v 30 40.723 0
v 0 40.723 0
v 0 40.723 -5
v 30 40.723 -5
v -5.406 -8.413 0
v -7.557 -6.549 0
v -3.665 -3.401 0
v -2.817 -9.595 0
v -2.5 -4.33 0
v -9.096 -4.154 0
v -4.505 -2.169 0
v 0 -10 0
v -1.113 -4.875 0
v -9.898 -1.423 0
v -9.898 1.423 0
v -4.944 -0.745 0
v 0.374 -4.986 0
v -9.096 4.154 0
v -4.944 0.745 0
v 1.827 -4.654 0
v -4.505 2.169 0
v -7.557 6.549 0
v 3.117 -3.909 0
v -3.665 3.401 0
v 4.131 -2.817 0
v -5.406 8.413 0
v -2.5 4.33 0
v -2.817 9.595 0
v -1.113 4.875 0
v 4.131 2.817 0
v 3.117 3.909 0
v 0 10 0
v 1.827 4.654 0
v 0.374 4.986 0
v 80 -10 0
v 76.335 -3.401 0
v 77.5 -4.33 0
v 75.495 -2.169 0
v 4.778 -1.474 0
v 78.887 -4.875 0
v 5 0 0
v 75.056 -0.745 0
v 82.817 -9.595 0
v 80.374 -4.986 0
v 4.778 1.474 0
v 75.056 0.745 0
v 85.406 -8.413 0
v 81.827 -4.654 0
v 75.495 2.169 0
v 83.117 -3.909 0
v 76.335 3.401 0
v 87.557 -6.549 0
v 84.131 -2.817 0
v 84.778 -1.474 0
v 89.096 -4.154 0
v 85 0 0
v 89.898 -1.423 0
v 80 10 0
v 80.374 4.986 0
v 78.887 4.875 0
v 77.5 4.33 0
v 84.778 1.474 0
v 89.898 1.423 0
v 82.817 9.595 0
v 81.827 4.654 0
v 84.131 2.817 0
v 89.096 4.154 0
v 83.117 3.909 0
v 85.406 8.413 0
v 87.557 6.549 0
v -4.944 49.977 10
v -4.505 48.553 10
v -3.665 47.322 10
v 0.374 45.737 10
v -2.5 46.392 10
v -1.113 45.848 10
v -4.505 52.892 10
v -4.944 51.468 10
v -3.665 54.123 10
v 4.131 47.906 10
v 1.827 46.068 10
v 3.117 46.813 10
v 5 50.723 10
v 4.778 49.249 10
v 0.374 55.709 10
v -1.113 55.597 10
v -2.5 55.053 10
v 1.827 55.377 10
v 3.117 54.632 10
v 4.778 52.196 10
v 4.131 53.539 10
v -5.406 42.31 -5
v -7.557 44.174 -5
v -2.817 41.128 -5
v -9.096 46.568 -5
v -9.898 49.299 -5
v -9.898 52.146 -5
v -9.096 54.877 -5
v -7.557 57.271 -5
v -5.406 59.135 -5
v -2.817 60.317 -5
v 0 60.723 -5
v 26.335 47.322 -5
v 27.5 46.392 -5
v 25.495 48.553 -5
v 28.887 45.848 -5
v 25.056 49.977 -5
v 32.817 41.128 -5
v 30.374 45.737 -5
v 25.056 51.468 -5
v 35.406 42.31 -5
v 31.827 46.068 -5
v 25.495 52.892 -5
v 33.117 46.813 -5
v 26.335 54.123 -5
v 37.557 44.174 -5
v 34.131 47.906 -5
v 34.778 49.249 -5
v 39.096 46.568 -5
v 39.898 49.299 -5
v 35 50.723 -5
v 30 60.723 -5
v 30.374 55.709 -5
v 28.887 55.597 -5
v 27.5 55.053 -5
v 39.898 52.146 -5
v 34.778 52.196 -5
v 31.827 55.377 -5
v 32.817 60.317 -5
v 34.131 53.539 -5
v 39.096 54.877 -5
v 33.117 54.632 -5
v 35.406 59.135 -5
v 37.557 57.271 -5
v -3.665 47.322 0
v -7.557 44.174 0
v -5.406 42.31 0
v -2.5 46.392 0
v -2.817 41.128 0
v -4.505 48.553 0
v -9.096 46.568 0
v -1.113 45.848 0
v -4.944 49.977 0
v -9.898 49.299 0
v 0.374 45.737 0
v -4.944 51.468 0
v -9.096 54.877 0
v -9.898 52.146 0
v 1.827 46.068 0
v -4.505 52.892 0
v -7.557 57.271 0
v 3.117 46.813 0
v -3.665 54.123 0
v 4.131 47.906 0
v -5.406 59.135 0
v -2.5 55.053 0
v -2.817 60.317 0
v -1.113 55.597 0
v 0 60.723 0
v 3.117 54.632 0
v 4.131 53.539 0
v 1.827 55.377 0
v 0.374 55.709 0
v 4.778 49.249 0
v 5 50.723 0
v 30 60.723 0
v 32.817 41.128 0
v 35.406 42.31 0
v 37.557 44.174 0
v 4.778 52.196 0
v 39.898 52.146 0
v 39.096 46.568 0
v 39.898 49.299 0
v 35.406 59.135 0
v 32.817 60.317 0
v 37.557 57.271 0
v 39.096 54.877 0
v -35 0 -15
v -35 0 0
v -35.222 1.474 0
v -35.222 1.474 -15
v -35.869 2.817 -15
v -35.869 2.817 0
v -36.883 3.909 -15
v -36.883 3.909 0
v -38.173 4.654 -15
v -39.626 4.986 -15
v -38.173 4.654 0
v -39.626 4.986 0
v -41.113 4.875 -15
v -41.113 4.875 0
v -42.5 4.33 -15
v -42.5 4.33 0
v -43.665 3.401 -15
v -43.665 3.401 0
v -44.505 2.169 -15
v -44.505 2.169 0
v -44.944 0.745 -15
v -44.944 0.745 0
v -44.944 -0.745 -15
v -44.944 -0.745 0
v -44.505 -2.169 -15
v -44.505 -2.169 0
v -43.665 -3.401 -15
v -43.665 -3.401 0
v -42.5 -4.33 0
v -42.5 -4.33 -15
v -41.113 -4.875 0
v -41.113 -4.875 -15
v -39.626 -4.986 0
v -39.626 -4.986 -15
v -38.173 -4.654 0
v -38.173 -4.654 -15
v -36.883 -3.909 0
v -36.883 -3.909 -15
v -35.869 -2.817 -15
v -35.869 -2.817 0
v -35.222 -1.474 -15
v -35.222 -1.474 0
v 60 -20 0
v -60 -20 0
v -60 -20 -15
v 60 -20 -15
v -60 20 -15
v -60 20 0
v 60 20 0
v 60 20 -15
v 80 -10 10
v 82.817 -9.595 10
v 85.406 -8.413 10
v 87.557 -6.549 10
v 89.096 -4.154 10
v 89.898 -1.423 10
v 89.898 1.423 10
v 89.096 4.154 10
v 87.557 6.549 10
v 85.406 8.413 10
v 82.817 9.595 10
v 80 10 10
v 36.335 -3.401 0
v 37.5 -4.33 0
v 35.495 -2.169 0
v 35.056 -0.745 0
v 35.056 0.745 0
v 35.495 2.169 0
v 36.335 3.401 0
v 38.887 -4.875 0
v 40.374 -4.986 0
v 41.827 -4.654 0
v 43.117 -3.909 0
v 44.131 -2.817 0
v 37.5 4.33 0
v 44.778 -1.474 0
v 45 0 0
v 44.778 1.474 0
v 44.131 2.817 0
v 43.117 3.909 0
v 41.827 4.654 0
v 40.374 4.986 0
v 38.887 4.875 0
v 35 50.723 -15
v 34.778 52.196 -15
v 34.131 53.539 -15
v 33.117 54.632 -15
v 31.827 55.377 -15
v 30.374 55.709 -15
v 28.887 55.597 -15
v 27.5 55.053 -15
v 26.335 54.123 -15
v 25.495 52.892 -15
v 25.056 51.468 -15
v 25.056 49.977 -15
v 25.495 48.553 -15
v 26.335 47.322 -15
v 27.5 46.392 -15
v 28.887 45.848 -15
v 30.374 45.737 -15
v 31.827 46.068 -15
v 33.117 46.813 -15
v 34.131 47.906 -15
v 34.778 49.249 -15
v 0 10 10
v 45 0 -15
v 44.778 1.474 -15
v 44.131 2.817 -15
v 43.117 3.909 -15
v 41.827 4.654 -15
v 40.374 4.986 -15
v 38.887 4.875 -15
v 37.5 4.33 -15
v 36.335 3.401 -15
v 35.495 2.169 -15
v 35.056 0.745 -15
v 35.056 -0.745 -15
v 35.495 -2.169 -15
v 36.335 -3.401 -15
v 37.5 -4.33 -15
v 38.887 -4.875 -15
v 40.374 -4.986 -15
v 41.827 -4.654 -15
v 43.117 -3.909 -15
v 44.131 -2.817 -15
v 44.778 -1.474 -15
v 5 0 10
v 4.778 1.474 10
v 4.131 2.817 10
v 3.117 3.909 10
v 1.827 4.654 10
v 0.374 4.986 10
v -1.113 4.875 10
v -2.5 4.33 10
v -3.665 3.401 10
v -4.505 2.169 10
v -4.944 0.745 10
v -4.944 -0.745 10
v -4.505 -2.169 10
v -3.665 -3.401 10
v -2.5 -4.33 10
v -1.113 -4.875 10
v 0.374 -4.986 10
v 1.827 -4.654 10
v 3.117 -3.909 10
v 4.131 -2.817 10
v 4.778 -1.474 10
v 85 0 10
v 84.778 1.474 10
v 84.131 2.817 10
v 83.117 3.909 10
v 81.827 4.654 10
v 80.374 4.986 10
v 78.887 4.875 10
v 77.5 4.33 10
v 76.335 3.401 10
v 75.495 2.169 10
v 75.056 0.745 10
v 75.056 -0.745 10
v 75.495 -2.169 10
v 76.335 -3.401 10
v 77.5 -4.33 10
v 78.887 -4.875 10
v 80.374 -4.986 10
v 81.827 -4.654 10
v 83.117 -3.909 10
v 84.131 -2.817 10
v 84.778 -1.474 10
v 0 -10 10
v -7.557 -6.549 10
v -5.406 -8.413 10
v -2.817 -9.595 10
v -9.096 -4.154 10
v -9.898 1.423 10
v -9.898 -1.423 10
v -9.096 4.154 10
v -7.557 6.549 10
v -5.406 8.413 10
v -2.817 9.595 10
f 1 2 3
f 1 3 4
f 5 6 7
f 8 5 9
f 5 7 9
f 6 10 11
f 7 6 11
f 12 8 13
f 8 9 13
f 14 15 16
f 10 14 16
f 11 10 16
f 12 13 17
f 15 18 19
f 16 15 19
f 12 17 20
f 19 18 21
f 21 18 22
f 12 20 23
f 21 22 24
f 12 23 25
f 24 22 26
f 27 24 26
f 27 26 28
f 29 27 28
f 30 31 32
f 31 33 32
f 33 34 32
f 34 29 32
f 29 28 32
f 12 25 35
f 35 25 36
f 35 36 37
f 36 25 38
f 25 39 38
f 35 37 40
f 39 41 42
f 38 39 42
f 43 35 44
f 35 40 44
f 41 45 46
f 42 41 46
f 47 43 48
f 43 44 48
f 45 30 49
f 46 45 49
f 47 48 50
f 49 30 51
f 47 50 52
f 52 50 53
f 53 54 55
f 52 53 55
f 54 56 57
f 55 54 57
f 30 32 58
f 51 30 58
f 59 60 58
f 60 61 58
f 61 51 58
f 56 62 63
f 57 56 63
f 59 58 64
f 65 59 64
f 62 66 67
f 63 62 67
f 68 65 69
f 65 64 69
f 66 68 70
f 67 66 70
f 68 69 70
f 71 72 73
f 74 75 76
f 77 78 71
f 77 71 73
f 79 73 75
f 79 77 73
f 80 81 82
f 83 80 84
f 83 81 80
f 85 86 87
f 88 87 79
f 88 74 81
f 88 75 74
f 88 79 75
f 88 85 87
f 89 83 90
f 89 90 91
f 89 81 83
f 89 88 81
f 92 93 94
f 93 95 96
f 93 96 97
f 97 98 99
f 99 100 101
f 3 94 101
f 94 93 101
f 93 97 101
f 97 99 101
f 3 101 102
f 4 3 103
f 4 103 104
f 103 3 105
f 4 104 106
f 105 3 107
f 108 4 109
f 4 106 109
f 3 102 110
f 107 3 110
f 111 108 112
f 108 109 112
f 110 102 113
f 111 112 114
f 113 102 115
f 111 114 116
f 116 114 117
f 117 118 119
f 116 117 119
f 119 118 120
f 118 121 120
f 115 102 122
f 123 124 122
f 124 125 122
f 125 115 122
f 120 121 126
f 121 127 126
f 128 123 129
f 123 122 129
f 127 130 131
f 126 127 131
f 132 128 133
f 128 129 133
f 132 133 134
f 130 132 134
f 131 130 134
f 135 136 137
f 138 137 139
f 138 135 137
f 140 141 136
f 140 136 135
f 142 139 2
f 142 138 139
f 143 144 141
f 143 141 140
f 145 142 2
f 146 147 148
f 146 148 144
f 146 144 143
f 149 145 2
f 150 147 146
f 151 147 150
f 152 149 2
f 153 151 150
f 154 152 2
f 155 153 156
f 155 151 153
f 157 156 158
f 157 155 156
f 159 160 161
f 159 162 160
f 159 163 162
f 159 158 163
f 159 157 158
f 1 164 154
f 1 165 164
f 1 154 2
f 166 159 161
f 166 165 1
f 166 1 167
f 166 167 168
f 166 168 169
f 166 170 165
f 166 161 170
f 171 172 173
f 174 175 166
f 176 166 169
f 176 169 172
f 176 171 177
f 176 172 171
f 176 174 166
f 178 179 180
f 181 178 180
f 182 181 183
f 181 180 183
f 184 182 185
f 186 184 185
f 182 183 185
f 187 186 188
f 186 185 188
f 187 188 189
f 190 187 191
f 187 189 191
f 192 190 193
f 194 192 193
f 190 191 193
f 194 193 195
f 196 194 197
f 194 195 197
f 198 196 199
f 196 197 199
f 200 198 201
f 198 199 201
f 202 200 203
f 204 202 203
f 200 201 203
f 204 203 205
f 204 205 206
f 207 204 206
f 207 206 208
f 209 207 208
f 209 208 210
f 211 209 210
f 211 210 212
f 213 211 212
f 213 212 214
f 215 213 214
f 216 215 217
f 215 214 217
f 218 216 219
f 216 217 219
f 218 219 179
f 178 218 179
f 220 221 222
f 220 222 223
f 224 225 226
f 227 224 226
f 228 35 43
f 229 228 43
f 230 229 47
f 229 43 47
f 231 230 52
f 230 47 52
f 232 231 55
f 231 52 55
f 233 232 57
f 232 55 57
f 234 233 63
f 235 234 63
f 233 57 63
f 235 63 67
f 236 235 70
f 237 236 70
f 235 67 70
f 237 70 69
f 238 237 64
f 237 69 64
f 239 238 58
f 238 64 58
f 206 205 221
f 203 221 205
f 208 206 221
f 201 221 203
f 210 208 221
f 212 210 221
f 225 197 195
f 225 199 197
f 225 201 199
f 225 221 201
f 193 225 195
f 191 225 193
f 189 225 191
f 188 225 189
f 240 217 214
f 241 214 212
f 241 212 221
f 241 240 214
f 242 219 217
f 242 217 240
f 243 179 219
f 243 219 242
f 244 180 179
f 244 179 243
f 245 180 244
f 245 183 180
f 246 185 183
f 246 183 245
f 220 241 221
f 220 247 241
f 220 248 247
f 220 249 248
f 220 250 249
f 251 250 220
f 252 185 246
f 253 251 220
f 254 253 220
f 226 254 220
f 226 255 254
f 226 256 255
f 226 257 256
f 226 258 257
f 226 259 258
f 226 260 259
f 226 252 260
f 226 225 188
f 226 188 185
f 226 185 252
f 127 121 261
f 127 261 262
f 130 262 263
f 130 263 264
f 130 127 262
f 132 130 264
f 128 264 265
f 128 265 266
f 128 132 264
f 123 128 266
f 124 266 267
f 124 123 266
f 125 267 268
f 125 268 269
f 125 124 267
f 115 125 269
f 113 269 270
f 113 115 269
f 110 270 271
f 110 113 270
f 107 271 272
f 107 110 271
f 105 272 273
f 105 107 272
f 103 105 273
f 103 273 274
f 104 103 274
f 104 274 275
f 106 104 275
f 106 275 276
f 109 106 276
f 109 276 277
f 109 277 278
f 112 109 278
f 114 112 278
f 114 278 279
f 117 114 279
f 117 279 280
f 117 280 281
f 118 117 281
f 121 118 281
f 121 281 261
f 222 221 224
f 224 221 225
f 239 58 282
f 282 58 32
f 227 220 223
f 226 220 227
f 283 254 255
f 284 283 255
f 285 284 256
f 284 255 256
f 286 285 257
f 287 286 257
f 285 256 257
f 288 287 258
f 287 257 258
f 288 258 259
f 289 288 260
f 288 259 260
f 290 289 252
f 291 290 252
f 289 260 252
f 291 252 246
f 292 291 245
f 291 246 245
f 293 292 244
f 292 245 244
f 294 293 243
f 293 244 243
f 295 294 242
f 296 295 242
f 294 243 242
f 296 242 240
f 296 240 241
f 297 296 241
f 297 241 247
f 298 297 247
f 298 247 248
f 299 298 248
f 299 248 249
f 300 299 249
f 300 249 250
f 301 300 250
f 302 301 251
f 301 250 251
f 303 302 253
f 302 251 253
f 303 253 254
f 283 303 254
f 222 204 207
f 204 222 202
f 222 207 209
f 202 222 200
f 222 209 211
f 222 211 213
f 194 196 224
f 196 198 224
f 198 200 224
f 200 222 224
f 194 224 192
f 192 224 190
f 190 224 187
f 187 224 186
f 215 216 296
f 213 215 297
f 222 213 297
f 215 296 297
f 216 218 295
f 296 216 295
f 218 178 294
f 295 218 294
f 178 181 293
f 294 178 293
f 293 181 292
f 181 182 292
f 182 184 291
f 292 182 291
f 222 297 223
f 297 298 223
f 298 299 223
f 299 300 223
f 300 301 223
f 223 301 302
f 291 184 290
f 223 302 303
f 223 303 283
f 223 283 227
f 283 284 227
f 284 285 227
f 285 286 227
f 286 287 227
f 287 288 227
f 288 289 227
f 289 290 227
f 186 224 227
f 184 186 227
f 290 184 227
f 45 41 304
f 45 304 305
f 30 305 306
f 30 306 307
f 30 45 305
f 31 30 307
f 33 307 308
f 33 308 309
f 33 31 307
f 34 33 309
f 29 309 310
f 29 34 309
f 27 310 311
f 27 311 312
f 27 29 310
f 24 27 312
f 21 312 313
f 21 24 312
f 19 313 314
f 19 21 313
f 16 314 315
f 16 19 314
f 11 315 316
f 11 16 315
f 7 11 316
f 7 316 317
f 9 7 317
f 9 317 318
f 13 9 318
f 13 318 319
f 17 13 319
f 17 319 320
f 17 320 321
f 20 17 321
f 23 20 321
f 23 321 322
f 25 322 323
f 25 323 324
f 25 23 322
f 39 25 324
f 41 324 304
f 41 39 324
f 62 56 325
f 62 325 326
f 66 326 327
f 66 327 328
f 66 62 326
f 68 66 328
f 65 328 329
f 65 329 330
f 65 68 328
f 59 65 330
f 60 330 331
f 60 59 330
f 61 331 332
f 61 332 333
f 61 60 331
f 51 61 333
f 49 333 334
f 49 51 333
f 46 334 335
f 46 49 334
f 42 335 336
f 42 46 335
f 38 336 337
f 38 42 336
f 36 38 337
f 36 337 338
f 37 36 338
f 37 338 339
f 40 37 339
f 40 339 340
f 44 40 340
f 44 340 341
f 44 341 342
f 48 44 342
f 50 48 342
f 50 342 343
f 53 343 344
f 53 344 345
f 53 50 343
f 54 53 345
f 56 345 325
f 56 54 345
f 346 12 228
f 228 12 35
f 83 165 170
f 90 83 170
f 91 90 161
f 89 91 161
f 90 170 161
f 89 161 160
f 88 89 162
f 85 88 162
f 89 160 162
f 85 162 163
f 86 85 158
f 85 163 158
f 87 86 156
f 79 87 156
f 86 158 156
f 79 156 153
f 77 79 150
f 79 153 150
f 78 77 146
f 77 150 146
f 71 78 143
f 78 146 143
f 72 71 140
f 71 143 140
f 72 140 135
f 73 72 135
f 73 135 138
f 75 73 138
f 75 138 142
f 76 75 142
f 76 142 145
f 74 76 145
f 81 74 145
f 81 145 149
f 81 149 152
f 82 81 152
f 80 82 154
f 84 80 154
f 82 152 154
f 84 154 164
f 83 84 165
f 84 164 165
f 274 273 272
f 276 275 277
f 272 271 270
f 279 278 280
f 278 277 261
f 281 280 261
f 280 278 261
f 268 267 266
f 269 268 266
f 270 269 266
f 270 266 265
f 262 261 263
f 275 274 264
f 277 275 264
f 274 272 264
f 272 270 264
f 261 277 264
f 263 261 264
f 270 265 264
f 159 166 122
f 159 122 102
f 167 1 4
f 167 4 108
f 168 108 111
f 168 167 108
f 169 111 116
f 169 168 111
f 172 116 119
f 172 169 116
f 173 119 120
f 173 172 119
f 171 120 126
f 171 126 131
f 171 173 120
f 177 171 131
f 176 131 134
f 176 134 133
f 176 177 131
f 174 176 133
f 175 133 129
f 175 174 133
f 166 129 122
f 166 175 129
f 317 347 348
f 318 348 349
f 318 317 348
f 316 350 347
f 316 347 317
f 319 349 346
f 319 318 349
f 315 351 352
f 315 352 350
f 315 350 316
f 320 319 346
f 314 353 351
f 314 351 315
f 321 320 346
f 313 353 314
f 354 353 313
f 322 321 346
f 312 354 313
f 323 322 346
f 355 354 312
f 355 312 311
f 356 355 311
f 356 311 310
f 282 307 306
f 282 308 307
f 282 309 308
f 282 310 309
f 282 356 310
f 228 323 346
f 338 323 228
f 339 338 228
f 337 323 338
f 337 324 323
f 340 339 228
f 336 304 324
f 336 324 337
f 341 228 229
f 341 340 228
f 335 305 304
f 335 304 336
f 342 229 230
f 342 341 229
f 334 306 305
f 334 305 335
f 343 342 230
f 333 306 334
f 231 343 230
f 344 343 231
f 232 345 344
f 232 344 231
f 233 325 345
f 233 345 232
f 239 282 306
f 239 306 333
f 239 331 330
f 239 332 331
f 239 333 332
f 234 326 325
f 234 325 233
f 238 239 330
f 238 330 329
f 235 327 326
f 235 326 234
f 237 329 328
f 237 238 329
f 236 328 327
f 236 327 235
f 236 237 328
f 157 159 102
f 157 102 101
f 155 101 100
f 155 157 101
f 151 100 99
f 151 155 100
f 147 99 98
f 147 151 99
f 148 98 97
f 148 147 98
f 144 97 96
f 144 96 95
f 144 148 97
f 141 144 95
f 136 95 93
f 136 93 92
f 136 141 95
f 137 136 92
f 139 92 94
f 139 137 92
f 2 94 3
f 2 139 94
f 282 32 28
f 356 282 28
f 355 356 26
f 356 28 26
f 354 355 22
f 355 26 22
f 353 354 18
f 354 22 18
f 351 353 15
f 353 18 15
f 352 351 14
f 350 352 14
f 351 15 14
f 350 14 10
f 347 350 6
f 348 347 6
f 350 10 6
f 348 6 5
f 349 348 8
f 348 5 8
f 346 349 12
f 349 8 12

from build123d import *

# Parameters (mm, degrees)
F0_W          = 120
F0_H          = 40
F0_R          = 5
F1_DEPTH      = 15
F2_R          = 5
F3_DEPTH      = 5
F4_DEPTH      = 10
F4_DEPTH_BACK = 5
F5_DEPTH      = 15
F6_R          = 5
F7_DEPTH      = 10


with BuildPart() as f1:
    # F0 (on Top) → F1 (new body)
    with BuildSketch(Plane.XY):
        Rectangle(F0_W, F0_H)
        with Locations((-40, 0)):
            Circle(F0_R, mode=Mode.SUBTRACT)
        with Locations((40, 0)):
            Circle(F0_R, mode=Mode.SUBTRACT)
    extrude(amount=-F1_DEPTH)


with BuildPart() as f3:
    # F2 (on Top) → F3 (new body)
    with BuildSketch(Plane.XY):
        with BuildLine():
            Line((30, 60.72257), (0, 60.72257))
            ThreePointArc((0, 60.72257), (-10, 50.72257), (0, 40.72257))
            Line((0, 40.72257), (30, 40.72257))
            ThreePointArc((30, 40.72257), (40, 50.72257), (30, 60.72257))
        make_face()
        with Locations((0, 50.72257)):
            Circle(F2_R, mode=Mode.SUBTRACT)
        with Locations((30, 50.72257)):
            Circle(F2_R, mode=Mode.SUBTRACT)
    extrude(amount=-F3_DEPTH)

    # F2 (on Top) → F4 (join, two sides)
    with BuildSketch(Plane.XY) as f4_sk:
        with Locations((0, 50.72257)):
            Circle(F2_R)
    extrude(amount=F4_DEPTH)
    extrude(f4_sk.sketch, amount=-F4_DEPTH_BACK)

    # F2 (on Top) → F5 (join)
    with BuildSketch(Plane.XY):
        with Locations((30, 50.72257)):
            Circle(F2_R)
    extrude(amount=-F5_DEPTH)


with BuildPart() as f7:
    # F6 (on Top) → F7 (new body)
    with BuildSketch(Plane.XY):
        with BuildLine():
            Line((80, 10), (0, 10))
            ThreePointArc((0, 10), (-10, 0), (0, -10))
            Line((0, -10), (80, -10))
            ThreePointArc((80, -10), (90, 0), (80, 10))
        make_face()
        Circle(F6_R, mode=Mode.SUBTRACT)
        with Locations((80, 0)):
            Circle(F6_R, mode=Mode.SUBTRACT)
    extrude(amount=F7_DEPTH)


solid = Compound([f1.part, f3.part, f7.part])
